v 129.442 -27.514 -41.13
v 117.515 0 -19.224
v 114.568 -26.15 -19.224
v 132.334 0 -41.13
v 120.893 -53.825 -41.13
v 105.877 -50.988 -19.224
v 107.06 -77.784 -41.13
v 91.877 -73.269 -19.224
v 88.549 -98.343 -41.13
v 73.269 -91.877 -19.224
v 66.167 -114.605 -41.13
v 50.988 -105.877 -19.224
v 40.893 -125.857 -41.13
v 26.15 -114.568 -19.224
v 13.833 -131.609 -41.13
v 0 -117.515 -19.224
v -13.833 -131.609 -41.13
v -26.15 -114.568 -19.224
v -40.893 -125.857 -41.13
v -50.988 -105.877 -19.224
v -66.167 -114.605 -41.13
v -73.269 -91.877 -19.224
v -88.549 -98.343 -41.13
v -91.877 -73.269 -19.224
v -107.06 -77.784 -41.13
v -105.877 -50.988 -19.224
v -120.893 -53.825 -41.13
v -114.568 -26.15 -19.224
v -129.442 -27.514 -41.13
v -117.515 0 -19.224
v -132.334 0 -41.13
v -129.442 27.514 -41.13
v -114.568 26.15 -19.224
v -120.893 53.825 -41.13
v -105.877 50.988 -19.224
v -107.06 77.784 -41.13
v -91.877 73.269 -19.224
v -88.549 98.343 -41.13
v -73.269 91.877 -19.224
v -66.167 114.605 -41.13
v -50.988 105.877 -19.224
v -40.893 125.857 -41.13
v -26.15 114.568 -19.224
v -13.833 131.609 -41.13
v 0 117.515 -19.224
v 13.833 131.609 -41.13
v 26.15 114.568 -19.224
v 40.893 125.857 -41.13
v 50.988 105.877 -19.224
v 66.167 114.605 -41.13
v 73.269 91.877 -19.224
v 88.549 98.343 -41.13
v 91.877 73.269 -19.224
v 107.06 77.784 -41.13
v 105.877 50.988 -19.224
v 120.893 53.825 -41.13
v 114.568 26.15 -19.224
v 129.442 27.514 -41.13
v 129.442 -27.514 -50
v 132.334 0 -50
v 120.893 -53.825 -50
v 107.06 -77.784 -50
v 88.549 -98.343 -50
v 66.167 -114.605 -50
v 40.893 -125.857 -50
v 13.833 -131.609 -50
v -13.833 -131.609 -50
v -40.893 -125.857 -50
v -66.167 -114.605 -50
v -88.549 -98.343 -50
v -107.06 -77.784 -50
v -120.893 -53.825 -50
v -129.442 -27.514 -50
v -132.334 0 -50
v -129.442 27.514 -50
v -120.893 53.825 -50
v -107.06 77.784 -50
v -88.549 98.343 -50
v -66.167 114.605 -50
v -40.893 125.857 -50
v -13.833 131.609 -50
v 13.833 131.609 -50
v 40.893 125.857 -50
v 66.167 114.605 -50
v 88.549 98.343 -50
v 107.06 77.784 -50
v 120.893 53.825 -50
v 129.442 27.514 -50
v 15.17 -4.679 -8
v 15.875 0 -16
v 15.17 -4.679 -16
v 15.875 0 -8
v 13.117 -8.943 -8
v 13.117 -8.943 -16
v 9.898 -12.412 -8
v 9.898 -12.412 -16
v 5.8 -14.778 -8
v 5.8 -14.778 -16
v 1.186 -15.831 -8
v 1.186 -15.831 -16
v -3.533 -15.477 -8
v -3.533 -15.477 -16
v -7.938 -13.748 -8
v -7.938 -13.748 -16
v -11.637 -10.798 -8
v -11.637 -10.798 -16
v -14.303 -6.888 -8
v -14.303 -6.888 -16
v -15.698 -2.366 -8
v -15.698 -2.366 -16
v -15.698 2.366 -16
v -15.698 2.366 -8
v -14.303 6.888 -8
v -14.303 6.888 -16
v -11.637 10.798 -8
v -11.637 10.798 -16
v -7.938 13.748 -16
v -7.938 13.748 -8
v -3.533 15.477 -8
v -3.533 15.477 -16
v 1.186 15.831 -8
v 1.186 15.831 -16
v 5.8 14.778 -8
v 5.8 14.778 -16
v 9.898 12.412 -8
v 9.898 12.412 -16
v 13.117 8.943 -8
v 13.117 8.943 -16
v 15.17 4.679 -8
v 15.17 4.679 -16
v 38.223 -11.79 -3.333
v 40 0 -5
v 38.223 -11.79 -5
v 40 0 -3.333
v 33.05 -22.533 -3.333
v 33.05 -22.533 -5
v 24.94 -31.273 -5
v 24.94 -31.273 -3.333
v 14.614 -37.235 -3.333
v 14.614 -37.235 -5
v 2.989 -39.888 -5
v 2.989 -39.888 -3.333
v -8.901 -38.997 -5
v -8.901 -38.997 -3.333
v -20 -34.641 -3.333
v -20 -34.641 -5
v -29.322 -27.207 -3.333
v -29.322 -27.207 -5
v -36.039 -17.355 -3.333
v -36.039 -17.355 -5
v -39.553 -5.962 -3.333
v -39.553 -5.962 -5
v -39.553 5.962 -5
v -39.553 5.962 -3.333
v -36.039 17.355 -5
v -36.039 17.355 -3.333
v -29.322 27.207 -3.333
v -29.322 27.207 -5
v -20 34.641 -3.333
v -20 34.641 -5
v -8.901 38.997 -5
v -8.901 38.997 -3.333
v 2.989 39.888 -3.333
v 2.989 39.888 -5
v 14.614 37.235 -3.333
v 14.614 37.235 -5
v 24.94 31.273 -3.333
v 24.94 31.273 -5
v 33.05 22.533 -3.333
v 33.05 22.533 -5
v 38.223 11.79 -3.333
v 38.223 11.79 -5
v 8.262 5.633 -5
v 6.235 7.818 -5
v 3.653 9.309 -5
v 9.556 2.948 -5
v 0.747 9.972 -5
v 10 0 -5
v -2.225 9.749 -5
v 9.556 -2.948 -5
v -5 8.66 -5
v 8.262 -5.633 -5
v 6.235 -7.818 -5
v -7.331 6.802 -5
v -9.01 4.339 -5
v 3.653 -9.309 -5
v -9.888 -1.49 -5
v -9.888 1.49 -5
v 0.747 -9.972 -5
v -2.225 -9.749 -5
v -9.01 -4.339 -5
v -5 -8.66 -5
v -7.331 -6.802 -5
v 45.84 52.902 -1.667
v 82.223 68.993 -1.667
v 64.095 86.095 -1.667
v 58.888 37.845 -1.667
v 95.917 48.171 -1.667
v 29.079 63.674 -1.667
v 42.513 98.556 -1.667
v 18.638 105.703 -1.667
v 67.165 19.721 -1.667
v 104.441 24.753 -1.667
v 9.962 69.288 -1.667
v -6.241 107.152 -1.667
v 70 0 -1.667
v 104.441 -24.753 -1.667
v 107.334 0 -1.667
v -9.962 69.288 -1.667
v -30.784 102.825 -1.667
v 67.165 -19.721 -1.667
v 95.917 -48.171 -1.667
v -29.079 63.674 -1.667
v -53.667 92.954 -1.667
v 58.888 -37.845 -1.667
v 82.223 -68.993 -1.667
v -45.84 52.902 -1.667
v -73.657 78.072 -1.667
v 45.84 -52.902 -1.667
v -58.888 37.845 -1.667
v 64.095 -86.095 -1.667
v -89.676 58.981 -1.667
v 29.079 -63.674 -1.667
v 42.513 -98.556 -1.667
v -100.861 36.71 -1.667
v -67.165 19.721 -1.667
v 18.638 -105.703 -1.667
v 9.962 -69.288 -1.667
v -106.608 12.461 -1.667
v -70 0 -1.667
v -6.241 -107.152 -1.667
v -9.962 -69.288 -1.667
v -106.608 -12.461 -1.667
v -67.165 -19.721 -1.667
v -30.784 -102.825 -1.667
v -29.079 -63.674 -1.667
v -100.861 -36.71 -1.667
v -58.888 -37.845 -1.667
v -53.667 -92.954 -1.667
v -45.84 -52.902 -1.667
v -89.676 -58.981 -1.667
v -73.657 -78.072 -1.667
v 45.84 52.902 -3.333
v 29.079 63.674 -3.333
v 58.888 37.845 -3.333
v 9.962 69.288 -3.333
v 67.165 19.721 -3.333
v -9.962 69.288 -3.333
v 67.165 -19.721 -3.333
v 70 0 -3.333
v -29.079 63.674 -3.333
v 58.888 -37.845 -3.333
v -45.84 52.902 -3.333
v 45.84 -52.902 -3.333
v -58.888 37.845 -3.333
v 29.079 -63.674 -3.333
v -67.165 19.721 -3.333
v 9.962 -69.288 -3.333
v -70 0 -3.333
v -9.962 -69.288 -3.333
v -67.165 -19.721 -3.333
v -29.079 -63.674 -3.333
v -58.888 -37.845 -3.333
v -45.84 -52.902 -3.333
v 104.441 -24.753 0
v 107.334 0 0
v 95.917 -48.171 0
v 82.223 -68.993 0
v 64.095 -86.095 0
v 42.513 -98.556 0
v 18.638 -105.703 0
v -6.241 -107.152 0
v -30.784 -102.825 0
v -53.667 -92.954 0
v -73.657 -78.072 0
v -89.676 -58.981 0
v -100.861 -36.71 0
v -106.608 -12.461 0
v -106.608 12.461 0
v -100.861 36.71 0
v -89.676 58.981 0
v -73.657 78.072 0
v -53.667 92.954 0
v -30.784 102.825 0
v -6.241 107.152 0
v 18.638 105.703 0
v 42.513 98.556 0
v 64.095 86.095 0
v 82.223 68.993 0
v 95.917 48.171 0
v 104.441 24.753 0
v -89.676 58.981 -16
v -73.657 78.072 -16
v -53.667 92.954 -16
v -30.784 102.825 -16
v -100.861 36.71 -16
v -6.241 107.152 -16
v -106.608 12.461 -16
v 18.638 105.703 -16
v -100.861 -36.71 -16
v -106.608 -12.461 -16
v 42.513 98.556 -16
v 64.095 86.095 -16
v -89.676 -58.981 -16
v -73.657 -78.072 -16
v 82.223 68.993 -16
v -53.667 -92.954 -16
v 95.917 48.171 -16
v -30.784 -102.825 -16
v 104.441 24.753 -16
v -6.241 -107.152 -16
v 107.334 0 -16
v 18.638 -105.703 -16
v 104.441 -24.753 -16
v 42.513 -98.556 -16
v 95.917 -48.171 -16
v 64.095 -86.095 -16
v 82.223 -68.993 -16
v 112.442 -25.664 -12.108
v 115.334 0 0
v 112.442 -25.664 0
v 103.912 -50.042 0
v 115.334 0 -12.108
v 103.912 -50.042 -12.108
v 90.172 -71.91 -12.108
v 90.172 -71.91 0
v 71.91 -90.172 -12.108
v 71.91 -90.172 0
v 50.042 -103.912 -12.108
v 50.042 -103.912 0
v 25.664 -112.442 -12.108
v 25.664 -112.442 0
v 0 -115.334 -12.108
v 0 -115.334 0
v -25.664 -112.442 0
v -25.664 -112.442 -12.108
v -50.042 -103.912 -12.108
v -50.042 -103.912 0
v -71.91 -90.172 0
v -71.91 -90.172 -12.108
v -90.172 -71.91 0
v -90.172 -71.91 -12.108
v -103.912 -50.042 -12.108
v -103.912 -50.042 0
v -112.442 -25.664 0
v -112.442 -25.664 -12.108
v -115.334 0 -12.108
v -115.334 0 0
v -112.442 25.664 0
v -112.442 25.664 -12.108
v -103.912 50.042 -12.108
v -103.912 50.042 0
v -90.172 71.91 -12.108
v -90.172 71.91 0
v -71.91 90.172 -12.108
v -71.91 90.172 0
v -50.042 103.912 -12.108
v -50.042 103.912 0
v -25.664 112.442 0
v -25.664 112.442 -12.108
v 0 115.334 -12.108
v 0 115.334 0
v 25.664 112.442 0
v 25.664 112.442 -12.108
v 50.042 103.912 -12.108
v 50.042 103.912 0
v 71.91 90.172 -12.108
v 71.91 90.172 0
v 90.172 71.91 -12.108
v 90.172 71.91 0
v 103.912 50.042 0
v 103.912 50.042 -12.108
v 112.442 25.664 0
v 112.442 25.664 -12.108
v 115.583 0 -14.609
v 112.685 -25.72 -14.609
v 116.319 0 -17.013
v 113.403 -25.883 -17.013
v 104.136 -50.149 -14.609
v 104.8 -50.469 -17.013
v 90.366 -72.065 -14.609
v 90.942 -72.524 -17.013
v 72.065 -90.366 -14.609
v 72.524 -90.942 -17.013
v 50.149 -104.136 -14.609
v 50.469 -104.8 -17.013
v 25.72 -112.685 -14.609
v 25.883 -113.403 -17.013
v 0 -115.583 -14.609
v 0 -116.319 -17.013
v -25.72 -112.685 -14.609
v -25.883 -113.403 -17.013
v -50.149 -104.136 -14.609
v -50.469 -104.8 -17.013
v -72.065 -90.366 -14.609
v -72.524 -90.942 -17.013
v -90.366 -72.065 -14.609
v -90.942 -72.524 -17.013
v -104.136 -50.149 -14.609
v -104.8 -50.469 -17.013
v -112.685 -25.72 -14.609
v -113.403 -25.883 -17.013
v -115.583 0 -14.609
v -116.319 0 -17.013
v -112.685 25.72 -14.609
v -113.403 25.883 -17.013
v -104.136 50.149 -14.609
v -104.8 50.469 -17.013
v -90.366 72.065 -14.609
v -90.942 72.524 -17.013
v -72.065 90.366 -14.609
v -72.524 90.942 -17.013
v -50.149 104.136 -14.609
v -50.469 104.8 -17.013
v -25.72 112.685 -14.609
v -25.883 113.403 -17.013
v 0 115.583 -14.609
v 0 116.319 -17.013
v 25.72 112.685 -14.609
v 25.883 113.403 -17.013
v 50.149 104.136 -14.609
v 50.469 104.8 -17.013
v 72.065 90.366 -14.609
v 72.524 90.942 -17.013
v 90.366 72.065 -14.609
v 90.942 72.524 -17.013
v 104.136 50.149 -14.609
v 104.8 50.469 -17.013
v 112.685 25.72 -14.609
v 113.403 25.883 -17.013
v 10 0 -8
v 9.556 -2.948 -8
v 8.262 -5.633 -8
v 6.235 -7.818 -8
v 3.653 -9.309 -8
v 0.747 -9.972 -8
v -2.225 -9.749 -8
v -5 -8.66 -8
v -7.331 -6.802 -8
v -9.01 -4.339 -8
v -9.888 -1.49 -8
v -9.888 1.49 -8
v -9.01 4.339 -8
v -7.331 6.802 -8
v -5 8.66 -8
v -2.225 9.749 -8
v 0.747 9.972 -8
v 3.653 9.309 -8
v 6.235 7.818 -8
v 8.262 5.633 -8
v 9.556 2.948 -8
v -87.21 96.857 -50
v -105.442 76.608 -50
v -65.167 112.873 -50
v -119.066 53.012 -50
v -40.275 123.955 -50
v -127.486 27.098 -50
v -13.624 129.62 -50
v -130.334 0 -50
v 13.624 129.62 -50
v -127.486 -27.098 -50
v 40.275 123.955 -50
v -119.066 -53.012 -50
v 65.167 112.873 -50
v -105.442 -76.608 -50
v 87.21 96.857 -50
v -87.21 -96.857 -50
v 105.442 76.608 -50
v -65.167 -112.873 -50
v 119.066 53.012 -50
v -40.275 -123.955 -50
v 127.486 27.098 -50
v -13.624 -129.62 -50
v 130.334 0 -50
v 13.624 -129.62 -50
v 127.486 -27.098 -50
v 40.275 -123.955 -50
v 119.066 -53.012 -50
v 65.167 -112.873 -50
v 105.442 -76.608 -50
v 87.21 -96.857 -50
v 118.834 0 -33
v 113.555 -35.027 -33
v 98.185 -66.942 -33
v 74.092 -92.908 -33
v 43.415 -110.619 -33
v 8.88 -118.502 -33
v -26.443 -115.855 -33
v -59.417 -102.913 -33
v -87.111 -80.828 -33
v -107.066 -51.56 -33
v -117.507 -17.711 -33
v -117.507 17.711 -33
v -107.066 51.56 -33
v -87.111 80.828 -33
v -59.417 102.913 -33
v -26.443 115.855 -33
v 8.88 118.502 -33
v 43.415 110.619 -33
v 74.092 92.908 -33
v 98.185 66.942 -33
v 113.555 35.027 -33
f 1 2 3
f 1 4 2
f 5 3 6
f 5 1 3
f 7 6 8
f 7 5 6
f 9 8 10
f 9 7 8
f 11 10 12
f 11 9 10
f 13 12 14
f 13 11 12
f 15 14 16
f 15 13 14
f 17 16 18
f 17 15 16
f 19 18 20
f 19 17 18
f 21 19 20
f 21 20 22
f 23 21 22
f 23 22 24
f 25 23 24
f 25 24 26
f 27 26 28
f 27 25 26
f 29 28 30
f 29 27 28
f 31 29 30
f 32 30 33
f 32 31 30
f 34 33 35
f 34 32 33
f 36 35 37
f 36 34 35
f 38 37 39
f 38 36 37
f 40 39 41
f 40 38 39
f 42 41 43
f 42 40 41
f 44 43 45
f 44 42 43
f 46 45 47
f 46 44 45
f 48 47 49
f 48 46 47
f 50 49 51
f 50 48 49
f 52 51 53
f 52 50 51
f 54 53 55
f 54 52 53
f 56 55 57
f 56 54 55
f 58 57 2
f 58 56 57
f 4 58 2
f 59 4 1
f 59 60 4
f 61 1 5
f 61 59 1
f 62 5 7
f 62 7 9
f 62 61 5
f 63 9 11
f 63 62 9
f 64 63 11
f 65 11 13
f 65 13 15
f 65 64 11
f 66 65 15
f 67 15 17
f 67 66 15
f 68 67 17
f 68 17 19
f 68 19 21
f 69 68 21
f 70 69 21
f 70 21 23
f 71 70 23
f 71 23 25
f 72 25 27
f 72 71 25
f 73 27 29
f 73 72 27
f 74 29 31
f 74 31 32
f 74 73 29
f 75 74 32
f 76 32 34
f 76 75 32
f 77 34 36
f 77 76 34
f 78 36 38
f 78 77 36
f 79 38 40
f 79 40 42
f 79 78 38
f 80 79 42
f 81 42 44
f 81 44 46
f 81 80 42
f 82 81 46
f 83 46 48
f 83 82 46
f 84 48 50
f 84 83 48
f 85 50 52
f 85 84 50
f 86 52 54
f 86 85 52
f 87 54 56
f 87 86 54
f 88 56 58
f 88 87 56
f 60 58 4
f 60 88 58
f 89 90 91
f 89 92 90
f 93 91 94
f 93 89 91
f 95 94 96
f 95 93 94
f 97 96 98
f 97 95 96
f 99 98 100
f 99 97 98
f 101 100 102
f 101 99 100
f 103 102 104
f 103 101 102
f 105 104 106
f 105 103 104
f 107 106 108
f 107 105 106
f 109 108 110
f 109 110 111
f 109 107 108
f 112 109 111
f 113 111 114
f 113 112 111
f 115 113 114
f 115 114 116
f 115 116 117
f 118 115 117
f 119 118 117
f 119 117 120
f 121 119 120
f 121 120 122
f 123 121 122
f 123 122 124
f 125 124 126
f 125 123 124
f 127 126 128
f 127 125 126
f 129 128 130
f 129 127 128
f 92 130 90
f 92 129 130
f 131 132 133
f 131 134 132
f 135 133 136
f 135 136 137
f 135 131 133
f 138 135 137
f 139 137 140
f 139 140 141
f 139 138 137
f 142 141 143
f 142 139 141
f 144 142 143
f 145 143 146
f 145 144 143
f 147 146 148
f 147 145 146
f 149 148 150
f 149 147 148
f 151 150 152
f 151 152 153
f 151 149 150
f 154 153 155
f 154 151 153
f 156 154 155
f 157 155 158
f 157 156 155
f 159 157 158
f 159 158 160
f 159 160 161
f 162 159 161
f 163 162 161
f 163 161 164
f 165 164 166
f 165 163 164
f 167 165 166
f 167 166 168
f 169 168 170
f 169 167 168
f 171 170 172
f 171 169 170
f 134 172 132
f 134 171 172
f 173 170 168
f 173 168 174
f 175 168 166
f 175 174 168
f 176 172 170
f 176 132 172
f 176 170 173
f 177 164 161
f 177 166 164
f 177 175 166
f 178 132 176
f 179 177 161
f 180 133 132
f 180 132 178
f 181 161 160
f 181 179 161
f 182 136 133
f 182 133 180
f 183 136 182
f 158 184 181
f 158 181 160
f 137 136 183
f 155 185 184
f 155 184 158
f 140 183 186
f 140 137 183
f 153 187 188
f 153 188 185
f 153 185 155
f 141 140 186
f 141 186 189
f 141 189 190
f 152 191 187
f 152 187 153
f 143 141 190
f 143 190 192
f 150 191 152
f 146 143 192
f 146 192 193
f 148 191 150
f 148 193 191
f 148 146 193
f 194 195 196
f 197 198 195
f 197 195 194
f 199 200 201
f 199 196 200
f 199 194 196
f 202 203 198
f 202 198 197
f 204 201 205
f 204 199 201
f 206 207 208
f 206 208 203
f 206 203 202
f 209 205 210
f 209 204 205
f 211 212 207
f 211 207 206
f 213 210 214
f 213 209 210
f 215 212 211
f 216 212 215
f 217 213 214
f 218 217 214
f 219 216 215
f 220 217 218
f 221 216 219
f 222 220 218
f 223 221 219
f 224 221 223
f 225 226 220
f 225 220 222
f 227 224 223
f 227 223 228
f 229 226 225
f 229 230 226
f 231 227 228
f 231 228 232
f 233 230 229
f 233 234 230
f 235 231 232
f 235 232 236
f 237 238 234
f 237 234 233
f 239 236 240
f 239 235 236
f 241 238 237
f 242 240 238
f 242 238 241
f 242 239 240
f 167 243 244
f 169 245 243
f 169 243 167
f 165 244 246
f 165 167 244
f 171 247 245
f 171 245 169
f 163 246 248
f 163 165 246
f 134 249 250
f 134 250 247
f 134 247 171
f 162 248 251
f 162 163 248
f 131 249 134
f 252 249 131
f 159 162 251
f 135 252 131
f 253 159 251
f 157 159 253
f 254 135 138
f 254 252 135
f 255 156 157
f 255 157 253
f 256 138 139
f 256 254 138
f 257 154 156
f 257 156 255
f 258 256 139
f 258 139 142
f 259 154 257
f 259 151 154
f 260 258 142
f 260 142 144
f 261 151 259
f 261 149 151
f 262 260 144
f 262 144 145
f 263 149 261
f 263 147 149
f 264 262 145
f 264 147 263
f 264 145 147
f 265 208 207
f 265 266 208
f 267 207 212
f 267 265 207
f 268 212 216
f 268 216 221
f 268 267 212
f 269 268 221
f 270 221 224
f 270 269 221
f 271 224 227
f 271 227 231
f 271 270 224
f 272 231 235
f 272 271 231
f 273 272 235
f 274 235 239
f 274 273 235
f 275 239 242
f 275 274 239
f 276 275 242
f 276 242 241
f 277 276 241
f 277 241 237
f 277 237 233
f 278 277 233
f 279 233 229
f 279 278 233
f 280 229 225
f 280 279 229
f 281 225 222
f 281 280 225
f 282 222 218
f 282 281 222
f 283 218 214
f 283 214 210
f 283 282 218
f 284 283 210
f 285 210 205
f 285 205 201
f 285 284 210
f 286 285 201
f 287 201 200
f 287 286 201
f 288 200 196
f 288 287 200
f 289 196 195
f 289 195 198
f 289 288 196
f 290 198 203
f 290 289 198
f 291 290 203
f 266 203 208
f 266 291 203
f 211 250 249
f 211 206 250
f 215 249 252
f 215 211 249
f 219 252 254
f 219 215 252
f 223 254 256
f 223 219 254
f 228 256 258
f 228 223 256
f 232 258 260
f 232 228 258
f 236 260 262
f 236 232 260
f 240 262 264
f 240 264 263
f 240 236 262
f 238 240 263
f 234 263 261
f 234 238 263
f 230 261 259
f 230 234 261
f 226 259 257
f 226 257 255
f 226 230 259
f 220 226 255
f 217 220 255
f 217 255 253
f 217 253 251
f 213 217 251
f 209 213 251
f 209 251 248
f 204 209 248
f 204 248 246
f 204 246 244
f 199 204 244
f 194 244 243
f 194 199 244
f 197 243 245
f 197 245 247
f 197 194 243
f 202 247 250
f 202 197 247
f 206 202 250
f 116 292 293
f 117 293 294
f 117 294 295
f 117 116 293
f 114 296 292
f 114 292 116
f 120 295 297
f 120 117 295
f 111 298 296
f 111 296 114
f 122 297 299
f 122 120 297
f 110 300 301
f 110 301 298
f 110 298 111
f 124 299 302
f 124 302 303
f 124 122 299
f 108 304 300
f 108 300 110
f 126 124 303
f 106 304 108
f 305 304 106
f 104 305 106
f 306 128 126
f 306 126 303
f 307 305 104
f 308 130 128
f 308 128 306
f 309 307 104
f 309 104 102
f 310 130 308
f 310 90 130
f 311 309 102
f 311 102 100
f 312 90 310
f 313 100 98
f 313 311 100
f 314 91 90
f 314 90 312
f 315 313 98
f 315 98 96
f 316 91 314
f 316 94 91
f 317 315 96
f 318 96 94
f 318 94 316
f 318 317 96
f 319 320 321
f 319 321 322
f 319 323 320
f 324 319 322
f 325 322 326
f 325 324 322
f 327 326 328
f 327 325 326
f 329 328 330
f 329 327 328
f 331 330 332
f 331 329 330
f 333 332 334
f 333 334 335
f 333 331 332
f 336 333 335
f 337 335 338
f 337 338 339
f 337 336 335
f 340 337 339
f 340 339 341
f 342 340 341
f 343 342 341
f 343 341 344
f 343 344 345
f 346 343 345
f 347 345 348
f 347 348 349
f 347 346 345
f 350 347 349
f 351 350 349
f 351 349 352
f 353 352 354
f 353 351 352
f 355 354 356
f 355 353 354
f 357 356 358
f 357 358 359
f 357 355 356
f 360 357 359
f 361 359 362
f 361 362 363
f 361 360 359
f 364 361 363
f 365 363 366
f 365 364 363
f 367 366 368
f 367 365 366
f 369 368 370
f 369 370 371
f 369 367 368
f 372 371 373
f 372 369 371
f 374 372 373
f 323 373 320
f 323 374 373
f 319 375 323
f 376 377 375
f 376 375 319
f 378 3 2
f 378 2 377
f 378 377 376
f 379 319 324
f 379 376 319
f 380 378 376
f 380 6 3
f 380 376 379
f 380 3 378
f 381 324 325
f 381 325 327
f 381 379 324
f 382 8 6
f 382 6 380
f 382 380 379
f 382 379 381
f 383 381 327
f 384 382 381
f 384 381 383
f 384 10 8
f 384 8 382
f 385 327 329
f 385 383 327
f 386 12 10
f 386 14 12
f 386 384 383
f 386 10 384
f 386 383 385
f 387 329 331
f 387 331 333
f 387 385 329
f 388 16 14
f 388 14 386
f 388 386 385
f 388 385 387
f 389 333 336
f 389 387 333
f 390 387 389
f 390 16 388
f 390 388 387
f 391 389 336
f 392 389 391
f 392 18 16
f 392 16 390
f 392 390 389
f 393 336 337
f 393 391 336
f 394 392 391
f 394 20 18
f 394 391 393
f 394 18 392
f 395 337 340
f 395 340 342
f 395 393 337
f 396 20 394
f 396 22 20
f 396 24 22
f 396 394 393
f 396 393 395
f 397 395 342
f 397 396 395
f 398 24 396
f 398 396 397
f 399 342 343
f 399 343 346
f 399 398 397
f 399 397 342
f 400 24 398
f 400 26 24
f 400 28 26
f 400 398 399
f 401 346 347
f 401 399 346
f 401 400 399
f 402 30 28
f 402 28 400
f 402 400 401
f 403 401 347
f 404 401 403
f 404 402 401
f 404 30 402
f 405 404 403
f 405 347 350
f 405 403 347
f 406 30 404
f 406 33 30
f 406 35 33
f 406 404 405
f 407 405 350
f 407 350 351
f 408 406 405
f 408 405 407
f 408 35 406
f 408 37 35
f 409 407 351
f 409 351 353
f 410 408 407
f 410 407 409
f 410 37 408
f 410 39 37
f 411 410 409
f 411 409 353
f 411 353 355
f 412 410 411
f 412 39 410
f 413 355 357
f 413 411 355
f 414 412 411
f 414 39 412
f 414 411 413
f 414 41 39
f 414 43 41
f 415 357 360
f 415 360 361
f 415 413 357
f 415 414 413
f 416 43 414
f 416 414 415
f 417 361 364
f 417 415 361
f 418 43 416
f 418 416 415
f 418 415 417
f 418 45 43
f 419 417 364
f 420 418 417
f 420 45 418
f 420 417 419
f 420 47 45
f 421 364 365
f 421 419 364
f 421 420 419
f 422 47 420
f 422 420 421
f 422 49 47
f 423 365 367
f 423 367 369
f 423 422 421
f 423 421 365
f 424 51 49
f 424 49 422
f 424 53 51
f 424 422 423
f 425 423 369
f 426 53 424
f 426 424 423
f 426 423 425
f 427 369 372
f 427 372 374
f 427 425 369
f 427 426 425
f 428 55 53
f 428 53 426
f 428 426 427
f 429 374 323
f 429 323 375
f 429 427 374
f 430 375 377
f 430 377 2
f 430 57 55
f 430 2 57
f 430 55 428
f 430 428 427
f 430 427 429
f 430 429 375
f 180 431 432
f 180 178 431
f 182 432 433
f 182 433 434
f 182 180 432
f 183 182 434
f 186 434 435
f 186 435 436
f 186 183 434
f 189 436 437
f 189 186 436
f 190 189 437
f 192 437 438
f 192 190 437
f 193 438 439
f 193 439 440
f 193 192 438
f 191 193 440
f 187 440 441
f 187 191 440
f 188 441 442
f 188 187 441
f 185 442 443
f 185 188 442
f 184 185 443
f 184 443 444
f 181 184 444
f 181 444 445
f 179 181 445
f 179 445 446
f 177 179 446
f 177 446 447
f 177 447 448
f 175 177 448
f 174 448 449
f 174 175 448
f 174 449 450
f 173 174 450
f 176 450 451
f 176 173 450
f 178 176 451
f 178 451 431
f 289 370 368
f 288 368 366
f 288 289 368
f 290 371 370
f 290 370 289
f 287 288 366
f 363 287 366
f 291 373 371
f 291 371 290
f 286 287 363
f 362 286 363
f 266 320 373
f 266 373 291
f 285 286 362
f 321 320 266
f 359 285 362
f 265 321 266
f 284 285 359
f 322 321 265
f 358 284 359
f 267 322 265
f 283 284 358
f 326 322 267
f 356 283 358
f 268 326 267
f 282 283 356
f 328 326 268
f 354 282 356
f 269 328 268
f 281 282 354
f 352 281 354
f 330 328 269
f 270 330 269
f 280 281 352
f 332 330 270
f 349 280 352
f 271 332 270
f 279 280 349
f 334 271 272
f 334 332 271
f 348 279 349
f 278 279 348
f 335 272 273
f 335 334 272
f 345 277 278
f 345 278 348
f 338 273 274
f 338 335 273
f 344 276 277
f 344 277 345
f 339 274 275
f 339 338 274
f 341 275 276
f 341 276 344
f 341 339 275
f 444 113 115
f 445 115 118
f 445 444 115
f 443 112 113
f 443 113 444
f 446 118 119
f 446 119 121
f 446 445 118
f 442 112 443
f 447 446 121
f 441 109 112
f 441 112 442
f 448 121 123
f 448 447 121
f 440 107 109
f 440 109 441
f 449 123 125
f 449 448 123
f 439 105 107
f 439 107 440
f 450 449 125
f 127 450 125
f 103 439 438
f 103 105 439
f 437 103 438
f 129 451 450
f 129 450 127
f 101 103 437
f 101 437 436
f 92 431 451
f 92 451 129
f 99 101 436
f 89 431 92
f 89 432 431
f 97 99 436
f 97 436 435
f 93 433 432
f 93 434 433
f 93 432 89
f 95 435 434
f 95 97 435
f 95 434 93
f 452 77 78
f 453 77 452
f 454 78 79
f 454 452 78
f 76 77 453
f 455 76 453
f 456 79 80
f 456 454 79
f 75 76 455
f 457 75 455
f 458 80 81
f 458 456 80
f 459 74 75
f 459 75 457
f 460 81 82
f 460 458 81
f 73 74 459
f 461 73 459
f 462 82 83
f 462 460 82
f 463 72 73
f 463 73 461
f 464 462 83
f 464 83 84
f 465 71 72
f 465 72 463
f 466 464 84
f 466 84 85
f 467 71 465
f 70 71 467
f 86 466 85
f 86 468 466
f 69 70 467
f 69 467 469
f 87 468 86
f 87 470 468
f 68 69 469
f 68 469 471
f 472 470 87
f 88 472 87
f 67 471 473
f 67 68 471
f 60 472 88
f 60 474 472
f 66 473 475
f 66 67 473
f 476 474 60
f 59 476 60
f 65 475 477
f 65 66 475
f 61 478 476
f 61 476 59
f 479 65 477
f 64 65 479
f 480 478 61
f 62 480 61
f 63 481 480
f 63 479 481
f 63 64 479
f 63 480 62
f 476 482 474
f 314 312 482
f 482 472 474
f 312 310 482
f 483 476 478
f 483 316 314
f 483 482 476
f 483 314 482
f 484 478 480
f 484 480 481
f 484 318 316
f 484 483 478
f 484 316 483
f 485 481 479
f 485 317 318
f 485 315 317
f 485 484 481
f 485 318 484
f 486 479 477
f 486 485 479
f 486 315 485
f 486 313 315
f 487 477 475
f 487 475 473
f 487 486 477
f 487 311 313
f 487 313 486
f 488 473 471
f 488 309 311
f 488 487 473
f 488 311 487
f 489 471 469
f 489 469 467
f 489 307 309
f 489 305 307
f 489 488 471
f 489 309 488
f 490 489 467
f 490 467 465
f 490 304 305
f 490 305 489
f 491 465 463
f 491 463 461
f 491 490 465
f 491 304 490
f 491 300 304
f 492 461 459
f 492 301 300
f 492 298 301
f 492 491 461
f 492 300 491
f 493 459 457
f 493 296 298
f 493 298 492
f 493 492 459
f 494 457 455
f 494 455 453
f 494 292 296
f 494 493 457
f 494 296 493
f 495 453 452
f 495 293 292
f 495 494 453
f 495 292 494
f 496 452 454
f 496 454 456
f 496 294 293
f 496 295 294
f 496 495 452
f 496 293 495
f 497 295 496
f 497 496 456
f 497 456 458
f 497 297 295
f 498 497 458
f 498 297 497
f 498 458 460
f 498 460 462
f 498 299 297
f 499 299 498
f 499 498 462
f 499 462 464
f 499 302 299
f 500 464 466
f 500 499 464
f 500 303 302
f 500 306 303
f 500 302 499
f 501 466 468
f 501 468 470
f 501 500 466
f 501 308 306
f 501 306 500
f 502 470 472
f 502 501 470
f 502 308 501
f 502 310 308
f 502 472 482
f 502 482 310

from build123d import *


with BuildPart() as part:
    # Sketch1 → Revolve1 (revolve)
    with BuildSketch(Plane.YZ, mode=Mode.PRIVATE) as revolve1_sk:
        with BuildLine():
            Line((-107.334, 0), (-115.334, 0))
            Line((-115.334, 0), (-115.334, -12.1078633))
            ThreePointArc((-115.334, -12.1078633), (-115.891433721, -15.829164705), (-117.514800653, -19.22379227))
            Line((-117.514800653, -19.22379227), (-132.334, -41.130434783))
            Line((-132.334, -41.130434783), (-132.334, -50))
            Line((-132.334, -50), (-130.334, -50))
            Line((-130.334, -50), (-107.334, -16))
            Line((-107.334, -16), (-15.875, -16))
            Line((-15.875, -16), (-15.875, -8))
            Line((-15.875, -8), (-10, -8))
            Line((-10, -8), (-10, -5))
            Line((-10, -5), (-40, -5))
            Line((-40, -5), (-40, -3.333333333))
            Line((-40, -3.333333333), (-70, -3.333333333))
            Line((-70, -3.333333333), (-70, -1.666666667))
            Line((-70, -1.666666667), (-107.334, -1.666666667))
            Line((-107.334, -1.666666667), (-107.334, 0))
        make_face()
    revolve(revolve1_sk.sketch.rotate(Axis((0, 0, 55), (0, 0, -1)), 270), axis=Axis((0, 0, 55), (0, 0, -1)))


solid = part.part
